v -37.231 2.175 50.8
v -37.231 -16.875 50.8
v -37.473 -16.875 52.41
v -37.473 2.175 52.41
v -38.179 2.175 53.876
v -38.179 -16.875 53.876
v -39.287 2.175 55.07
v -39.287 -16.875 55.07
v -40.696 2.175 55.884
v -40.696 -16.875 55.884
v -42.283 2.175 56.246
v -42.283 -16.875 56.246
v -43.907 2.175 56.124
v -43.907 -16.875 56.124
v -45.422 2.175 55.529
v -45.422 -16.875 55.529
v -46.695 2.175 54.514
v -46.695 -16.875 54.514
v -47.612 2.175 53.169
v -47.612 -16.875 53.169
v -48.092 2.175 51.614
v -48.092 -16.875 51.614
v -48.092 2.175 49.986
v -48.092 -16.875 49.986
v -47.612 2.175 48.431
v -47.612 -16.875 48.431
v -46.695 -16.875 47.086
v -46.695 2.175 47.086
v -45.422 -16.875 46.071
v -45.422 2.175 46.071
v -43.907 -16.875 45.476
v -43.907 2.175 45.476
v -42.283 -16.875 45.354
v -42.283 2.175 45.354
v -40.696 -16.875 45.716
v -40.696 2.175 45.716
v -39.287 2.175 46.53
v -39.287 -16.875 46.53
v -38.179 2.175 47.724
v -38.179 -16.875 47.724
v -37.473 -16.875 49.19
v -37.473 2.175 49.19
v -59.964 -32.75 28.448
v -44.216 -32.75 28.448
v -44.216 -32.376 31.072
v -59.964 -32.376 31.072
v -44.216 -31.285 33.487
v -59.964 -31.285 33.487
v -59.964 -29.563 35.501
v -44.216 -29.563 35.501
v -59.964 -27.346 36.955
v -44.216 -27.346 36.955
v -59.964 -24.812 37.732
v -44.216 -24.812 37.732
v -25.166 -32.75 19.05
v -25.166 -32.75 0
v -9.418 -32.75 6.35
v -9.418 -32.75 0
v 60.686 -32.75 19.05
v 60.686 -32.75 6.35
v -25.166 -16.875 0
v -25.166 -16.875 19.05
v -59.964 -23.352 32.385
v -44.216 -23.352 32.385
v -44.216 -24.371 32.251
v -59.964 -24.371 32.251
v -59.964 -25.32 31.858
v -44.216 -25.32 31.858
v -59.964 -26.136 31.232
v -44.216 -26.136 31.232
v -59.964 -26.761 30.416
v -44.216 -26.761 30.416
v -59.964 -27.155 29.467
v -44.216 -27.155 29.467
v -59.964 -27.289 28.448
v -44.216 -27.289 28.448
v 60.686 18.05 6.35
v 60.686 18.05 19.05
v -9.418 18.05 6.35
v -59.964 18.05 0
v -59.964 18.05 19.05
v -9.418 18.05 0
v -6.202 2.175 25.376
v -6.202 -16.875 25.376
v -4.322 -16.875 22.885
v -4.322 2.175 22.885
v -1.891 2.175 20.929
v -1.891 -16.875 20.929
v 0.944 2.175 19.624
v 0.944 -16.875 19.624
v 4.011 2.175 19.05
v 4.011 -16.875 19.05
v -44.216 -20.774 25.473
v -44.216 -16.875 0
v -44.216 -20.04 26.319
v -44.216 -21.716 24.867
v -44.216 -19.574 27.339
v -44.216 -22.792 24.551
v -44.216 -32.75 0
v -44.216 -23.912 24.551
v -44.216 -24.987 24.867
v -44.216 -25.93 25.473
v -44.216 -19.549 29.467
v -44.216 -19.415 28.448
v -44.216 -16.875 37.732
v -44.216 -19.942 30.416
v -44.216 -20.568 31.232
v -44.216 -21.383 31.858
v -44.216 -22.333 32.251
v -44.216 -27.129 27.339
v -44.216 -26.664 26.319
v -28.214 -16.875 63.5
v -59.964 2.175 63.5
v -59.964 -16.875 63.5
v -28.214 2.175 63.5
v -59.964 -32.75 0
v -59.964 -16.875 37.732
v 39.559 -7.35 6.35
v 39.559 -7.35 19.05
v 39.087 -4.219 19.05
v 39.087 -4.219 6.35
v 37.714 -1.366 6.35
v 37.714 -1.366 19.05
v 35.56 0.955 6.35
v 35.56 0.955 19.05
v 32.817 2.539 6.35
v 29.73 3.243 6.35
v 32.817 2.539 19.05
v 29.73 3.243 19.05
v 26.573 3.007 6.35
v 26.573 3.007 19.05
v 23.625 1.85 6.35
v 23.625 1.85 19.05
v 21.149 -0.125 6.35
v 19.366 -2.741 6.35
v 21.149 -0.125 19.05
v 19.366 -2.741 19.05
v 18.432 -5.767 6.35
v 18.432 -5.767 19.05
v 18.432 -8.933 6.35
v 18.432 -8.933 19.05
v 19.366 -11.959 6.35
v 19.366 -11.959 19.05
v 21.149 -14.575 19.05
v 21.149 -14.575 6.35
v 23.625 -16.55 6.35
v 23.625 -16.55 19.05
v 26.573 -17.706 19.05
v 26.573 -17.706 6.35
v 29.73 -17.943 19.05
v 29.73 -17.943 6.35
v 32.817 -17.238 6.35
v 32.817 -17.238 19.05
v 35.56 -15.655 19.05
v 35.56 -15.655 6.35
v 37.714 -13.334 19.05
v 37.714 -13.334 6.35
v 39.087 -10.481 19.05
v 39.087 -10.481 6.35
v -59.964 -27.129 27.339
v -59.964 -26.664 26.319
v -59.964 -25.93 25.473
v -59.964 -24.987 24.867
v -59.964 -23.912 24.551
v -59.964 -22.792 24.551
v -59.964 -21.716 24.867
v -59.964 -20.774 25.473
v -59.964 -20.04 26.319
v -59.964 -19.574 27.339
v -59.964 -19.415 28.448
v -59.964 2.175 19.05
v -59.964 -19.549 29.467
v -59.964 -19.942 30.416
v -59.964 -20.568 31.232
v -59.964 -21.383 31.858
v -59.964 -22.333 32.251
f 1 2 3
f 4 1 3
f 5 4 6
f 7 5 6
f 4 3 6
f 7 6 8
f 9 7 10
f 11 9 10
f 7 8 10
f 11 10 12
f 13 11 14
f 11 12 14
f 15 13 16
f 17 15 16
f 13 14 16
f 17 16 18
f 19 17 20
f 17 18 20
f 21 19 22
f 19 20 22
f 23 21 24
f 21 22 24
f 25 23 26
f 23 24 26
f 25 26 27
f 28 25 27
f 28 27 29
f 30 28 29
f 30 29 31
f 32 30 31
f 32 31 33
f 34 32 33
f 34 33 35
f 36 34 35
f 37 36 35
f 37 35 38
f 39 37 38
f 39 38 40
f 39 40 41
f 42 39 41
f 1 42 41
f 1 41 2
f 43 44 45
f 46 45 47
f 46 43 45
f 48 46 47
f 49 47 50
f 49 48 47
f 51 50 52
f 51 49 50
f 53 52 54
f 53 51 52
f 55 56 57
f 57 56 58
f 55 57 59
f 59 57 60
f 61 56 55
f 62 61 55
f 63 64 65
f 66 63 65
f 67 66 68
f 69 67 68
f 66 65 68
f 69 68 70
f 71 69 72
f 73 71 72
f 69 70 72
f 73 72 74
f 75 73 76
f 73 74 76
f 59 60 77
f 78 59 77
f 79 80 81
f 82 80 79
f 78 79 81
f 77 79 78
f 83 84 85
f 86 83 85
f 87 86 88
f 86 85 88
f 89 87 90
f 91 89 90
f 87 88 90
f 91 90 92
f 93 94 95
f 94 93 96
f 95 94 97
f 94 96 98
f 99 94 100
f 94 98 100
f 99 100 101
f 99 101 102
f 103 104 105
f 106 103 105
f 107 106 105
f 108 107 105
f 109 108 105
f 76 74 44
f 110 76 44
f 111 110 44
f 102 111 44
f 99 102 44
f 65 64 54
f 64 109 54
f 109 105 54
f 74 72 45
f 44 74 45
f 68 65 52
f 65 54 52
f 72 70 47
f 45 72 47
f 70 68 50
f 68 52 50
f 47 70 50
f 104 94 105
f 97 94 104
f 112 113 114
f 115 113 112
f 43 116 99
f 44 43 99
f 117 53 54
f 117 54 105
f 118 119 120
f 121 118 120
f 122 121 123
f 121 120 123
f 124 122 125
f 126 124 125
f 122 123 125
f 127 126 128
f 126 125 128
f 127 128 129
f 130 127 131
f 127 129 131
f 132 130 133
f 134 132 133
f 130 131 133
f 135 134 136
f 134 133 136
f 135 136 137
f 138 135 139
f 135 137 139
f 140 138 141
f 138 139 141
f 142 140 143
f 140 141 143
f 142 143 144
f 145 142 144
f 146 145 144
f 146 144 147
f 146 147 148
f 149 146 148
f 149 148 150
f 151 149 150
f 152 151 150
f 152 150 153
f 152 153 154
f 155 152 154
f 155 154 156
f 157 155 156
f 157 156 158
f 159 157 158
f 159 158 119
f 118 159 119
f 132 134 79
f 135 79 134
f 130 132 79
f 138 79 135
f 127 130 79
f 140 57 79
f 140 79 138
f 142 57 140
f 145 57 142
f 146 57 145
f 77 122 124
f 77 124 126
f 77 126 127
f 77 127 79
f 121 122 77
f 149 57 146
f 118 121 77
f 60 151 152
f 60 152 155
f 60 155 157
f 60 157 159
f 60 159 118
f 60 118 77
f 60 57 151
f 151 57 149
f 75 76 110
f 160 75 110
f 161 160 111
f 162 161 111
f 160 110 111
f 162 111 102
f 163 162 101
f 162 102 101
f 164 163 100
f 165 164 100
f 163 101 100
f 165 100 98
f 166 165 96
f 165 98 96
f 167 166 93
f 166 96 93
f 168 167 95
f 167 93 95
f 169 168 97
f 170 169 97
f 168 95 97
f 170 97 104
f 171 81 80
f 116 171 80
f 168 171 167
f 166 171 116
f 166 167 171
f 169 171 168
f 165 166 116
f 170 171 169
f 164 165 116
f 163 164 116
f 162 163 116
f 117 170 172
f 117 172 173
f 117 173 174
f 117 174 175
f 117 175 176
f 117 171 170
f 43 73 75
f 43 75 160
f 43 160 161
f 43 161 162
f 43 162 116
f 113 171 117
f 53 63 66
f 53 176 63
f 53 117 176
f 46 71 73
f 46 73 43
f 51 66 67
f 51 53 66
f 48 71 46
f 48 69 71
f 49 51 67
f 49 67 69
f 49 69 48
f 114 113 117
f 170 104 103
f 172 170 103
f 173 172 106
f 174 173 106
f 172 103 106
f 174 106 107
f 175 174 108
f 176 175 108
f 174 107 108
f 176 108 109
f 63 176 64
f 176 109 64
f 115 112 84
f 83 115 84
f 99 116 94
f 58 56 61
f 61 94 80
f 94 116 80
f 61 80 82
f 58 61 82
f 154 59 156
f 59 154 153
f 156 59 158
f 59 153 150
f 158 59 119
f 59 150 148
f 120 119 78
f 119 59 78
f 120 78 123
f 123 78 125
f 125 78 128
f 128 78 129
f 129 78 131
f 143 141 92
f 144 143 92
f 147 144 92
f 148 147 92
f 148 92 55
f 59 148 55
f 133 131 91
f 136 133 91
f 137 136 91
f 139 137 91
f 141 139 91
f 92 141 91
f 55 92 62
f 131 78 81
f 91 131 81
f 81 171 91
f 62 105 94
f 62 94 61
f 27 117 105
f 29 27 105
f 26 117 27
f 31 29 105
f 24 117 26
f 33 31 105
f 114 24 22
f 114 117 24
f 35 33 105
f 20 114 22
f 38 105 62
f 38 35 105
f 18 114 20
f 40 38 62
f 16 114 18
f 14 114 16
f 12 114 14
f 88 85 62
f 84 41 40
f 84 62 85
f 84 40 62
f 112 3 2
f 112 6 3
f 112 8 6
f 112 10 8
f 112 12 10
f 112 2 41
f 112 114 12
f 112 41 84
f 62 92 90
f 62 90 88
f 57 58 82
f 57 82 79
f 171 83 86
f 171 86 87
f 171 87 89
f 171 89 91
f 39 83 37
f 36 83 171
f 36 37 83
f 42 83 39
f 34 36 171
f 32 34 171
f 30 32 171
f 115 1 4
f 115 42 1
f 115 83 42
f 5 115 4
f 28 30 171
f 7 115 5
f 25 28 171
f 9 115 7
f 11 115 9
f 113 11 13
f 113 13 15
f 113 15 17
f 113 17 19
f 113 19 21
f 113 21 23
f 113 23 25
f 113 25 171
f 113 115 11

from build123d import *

# Parameters (mm, degrees)
F0_W      = 120.65
F0_H      = 50.8
F1_DEPTH  = 63.5
F2_W      = 70.104
F2_H      = 6.35
F3_DEPTH  = 50.801
F4_DEPTH  = 15.875
F6_DEPTH  = 15.875
F7_R      = 10.6228635498
F8_DEPTH  = 19.051
F9_R      = 5.461
F10_DEPTH = 19.304
F11_W     = 15.875
F11_H     = 16.4665063758
F12_DEPTH = 120.651
F14_DEPTH = 15.748
F16_DEPTH = 15.749


with BuildPart() as f1:
    # F0 (on Top) → F1 (new body)
    with BuildSketch(Plane.XY):
        with Locations((0.3614928573, -7.3499462176)):
            Rectangle(F0_W, F0_H)
    extrude(amount=F1_DEPTH)

    # F2 (on face) → F3 (cut, through all)
    with BuildSketch(Plane.XZ.offset(32.7499462176)):
        with BuildLine():
            ThreePointArc((-6.202439984, 25.3757133524), (-1.8909766077, 20.928804602), (4.0110406024, 19.05))
            Line((4.0110406024, 19.05), (5.5811246857, 19.05))
            Line((5.5811246857, 19.05), (60.6864928573, 19.05))
            Line((60.6864928573, 19.05), (60.6864928573, 63.5))
            Line((60.6864928573, 63.5), (-28.2135071427, 63.5))
            Line((-28.2135071427, 63.5), (-6.202439984, 25.3757133524))
        make_face()
        with Locations((25.6344928573, 3.175)):
            Rectangle(F2_W, F2_H)
    extrude(amount=-F3_DEPTH, mode=Mode.SUBTRACT)

    # F2 (on face) → F4 (cut)
    with BuildSketch(Plane.XZ.offset(32.7499462176)):
        with BuildLine():
            Line((-44.2155071427, 0), (-25.1655071427, 0))
            Line((-25.1655071427, 0), (-25.1655071427, 19.05))
            Line((-25.1655071427, 19.05), (4.0110406024, 19.05))
            ThreePointArc((4.0110406024, 19.05), (-1.8909766077, 20.928804602), (-6.202439984, 25.3757133524))
            Line((-6.202439984, 25.3757133524), (-28.2135071427, 63.5))
            Line((-28.2135071427, 63.5), (-59.9635071427, 63.5))
            Line((-59.9635071427, 63.5), (-59.9635071427, 44.9145063758))
            Line((-59.9635071427, 44.9145063758), (-44.2155071427, 44.9145063758))
            Line((-44.2155071427, 44.9145063758), (-44.2155071427, 28.448))
            Line((-44.2155071427, 28.448), (-44.2155071427, 0))
        make_face()
    extrude(amount=-F4_DEPTH, mode=Mode.SUBTRACT)

    # F5 (on face) → F6 (cut)
    with BuildSketch(Plane(origin=(0, 18.0500537824, 0), x_dir=(-1, 0, 0), z_dir=(0, 1, 0))):
        with BuildLine():
            Line((-4.0110406024, 19.05), (59.9635071427, 19.05))
            Line((59.9635071427, 19.05), (59.9635071427, 63.5))
            Line((59.9635071427, 63.5), (28.2135071427, 63.5))
            Line((28.2135071427, 63.5), (6.202439984, 25.3757133524))
            ThreePointArc((6.202439984, 25.3757133524), (1.8909766077, 20.928804602), (-4.0110406024, 19.05))
        make_face()
    extrude(amount=-F6_DEPTH, mode=Mode.SUBTRACT)

    # F7 (on face) → F8 (cut, through all)
    with BuildSketch(Plane.XY.offset(19.05)):
        with Locations((28.9364928573, -7.3499462176)):
            Circle(F7_R)
    extrude(amount=-F8_DEPTH, mode=Mode.SUBTRACT)

    # F9 (on face) → F10 (cut)
    with BuildSketch(Plane.XZ.offset(16.8749462176)):
        with Locations((-42.6915071427, 50.8)):
            Circle(F9_R)
    extrude(amount=-F10_DEPTH, mode=Mode.SUBTRACT)

    # F11 (on face) → F12 (cut, through all)
    with BuildSketch(Plane(origin=(-59.9635071427, 0, 0), x_dir=(0, -1, 0), z_dir=(-1, 0, 0))):
        with Locations((24.8124462176, 36.6812531879)):
            Rectangle(F11_W, F11_H)
    extrude(amount=-F12_DEPTH, mode=Mode.SUBTRACT)

    # F13 (on face) → F14 (join)
    with BuildSketch(Plane(origin=(-59.9635071427, 0, 0), x_dir=(0, -1, 0), z_dir=(-1, 0, 0))):
        with BuildLine():
            Line((16.8749462176, 28.448), (32.7499462176, 28.448))
            ThreePointArc((32.7499462176, 28.448), (30.4950611894, 34.5552344396), (24.8124462176, 37.7318216134))
            Line((24.8124462176, 37.7318216134), (16.8749462176, 37.7318216134))
            Line((16.8749462176, 37.7318216134), (16.8749462176, 28.448))
        make_face()
    extrude(amount=-F14_DEPTH)

    # F15 (on face) → F16 (cut, through all)
    with BuildSketch(Plane.YZ.offset(-44.2155071427)):
        with BuildLine():
            Line((-23.3519462176, 32.385), (-23.3519462176, 28.448))
            Line((-23.3519462176, 28.448), (-19.4149462176, 28.448))
            ThreePointArc((-19.4149462176, 28.448), (-20.5680668201, 31.2318793975), (-23.3519462176, 32.385))
        make_face()
        with BuildLine():
            Line((-19.4149462176, 28.448), (-23.3519462176, 28.448))
            Line((-23.3519462176, 28.448), (-27.2889462176, 28.448))
            ThreePointArc((-27.2889462176, 28.448), (-23.3519462176, 24.511), (-19.4149462176, 28.448))
        make_face()
        with BuildLine():
            Line((-27.2889462176, 28.448), (-23.3519462176, 28.448))
            Line((-23.3519462176, 28.448), (-23.3519462176, 32.385))
            ThreePointArc((-23.3519462176, 32.385), (-26.1358256151, 31.2318793975), (-27.2889462176, 28.448))
        make_face()
    extrude(amount=-F16_DEPTH, mode=Mode.SUBTRACT)


solid = f1.part
